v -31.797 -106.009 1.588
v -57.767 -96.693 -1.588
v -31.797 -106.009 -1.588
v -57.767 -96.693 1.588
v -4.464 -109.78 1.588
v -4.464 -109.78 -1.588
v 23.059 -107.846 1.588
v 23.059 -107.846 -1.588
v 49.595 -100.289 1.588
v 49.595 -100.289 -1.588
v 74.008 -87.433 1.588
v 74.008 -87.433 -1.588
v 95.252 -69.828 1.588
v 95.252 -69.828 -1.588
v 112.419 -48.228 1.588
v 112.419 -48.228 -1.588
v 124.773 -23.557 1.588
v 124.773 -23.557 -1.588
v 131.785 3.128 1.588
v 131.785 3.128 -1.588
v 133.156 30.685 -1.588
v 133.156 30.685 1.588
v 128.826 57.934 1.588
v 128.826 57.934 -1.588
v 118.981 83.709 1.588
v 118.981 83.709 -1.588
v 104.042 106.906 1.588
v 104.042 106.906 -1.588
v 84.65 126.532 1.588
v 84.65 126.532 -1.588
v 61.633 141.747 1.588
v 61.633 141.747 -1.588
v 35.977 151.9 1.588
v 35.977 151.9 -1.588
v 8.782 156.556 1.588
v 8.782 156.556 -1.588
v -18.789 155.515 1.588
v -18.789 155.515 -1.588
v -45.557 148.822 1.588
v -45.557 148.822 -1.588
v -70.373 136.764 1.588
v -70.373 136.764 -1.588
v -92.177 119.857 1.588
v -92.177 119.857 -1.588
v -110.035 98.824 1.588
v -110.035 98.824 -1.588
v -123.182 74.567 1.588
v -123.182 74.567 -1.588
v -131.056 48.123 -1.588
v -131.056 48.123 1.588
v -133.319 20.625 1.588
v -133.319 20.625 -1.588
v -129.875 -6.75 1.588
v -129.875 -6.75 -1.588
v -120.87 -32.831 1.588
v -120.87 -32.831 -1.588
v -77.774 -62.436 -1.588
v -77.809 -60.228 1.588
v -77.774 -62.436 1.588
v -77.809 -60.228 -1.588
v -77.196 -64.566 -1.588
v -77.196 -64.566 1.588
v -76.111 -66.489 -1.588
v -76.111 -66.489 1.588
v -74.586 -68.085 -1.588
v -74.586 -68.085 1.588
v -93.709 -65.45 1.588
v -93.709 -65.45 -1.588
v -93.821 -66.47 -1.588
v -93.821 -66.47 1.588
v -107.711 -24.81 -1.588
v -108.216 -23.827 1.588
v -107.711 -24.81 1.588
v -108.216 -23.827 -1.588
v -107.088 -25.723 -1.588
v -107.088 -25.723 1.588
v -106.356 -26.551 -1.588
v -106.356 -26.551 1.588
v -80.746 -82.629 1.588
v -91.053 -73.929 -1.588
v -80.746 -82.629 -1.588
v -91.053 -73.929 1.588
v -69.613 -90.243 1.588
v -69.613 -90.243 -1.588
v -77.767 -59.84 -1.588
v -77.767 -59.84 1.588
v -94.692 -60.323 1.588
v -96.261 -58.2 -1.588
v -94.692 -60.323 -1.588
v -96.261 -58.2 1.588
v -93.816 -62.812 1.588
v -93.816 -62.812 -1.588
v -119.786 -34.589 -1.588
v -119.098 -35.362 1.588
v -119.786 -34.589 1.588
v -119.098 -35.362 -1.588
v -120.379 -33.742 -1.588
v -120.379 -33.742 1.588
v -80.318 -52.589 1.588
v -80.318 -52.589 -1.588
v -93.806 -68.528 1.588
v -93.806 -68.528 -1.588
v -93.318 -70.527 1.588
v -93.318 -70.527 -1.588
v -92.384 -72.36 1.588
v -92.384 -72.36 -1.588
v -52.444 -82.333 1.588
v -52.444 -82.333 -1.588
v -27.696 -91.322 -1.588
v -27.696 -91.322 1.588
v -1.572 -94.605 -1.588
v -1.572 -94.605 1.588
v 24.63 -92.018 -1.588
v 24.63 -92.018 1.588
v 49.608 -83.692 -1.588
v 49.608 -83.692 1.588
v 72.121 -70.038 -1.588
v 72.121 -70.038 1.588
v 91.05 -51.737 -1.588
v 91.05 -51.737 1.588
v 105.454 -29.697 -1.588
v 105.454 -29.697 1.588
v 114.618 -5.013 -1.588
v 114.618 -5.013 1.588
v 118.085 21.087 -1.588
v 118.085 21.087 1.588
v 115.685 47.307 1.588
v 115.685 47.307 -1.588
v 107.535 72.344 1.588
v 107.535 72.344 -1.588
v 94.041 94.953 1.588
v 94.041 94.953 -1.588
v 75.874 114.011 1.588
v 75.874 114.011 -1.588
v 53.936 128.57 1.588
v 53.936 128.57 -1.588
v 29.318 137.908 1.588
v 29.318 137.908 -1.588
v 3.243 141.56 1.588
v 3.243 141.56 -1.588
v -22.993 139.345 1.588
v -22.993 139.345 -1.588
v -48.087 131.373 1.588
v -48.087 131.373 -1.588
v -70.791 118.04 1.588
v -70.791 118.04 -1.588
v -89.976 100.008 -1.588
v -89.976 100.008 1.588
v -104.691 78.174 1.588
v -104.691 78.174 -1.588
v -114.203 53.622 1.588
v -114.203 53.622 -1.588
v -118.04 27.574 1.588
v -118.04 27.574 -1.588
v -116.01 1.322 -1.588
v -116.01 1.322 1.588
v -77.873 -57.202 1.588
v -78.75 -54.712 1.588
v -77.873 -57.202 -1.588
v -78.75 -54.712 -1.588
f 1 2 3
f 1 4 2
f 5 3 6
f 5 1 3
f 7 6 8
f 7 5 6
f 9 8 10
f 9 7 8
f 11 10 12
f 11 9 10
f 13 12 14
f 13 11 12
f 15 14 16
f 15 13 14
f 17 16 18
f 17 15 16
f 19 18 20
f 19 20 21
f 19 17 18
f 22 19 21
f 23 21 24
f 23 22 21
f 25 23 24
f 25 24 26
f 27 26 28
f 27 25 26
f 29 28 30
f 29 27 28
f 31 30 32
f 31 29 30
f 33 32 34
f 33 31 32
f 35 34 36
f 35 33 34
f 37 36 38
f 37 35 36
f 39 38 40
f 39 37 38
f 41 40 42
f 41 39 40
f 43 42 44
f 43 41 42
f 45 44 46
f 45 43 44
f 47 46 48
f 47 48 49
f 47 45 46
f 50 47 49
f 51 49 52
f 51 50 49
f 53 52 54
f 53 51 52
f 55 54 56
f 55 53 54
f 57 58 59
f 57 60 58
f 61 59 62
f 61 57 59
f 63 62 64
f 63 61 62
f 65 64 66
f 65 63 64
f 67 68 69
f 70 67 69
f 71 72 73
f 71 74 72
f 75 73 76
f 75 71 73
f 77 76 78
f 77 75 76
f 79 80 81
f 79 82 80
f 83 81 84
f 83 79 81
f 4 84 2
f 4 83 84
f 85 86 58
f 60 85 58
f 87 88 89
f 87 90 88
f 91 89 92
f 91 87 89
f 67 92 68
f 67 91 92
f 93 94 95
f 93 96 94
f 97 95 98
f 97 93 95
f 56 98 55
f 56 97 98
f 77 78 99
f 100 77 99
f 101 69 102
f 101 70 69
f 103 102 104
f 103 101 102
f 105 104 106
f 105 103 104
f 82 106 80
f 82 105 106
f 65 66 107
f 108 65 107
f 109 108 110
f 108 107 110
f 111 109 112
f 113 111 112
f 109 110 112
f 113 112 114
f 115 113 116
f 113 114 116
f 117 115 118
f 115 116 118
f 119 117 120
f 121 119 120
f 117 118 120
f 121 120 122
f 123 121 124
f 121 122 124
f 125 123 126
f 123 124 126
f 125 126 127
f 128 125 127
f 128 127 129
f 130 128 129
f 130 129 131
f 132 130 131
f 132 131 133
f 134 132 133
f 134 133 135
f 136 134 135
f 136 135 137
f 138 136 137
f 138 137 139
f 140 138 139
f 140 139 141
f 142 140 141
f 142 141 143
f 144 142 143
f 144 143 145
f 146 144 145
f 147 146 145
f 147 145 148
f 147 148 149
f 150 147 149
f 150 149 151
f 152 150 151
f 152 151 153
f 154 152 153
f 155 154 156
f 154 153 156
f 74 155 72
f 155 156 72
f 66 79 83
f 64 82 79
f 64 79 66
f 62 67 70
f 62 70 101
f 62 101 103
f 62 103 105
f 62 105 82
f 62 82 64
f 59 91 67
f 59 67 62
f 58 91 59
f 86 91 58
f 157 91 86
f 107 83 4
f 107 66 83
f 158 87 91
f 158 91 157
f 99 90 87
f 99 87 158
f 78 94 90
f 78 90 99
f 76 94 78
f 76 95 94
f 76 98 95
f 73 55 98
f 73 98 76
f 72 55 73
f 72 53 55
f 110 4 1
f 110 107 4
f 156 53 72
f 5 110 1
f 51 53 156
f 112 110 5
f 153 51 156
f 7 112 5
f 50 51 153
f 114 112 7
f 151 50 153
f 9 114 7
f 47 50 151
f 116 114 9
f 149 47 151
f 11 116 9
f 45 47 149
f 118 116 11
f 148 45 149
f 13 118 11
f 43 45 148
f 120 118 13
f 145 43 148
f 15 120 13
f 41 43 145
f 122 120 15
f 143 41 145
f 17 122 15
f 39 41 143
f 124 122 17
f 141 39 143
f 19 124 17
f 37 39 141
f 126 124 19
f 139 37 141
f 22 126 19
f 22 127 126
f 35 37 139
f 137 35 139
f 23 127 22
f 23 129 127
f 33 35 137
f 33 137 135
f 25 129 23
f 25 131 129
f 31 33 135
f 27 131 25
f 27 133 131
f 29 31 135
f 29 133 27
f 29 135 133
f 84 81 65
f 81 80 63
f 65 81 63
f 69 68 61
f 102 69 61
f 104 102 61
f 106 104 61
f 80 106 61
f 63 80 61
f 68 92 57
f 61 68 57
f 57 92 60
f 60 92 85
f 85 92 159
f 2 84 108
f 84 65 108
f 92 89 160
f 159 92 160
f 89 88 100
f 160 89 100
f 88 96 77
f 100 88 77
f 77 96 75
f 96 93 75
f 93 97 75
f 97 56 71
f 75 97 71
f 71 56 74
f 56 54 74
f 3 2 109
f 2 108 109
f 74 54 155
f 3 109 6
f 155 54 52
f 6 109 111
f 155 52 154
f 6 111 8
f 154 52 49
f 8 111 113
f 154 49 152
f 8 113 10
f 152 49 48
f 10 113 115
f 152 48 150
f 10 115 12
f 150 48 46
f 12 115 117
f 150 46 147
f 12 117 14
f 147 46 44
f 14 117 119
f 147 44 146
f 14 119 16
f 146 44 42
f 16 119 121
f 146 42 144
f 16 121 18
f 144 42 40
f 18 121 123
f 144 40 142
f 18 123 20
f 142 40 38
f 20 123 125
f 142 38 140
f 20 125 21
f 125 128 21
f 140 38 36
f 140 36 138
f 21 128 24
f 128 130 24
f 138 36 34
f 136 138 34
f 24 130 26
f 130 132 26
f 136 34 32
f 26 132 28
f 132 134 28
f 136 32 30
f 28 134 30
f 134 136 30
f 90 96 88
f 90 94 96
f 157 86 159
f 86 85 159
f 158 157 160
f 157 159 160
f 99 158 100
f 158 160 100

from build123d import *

# Parameters (mm, degrees)
BOSS_EXTRUDE1_DEPTH = 1.5875
CUT_EXTRUDE1_DEPTH  = 3.175
FILLET1_R           = 8.89


with BuildPart() as part:
    # Sketch1 → Boss-Extrude1 (new, symmetric)
    with BuildSketch(Plane.XY):
        with BuildLine():
            Line((-120.187952283, -34.272453), (-93.24718392, -61.213221363))
            Line((-93.24718392, -61.213221363), (-94.292689271, -70.797689271))
            ThreePointArc((-94.292689271, -70.797689271), (-77.124658044, -85.289234251), (-57.767453, -96.692952283))
            ThreePointArc((-57.767453, -96.692952283), (94.292689271, 117.787689271), (-120.187952283, -34.272453))
        make_face()
    extrude(amount=BOSS_EXTRUDE1_DEPTH, both=True)

    # Sketch2 → Cut-Extrude1 (cut)
    with BuildSketch(Plane.XY.offset(1.5875)):
        with BuildLine():
            Line((-77.304798152, -55.60299244), (-78.320318415, -64.912577861))
            ThreePointArc((-78.320318415, -64.912577861), (94.997930523, 93.675946819), (-107.51910025, -25.388690342))
            Line((-107.51910025, -25.388690342), (-77.304798152, -55.60299244))
        make_face()
    extrude(amount=-CUT_EXTRUDE1_DEPTH, mode=Mode.SUBTRACT)

    # Fillet1
    fillet1_edges = [part.edges().sort_by_distance(p)[0] for p in [
        (-77.304798152, -55.60299244, 0),
        (-107.51910025, -25.388690342, 0),
        (-78.320318415, -64.912577861, 0),
        (-93.24718392, -61.213221363, -0.79375),
        (-120.187952283, -34.272453, -0.79375),
        (-94.292689271, -70.797689271, -0.79375),
    ]]
    fillet(fillet1_edges, radius=FILLET1_R)


solid = part.part
